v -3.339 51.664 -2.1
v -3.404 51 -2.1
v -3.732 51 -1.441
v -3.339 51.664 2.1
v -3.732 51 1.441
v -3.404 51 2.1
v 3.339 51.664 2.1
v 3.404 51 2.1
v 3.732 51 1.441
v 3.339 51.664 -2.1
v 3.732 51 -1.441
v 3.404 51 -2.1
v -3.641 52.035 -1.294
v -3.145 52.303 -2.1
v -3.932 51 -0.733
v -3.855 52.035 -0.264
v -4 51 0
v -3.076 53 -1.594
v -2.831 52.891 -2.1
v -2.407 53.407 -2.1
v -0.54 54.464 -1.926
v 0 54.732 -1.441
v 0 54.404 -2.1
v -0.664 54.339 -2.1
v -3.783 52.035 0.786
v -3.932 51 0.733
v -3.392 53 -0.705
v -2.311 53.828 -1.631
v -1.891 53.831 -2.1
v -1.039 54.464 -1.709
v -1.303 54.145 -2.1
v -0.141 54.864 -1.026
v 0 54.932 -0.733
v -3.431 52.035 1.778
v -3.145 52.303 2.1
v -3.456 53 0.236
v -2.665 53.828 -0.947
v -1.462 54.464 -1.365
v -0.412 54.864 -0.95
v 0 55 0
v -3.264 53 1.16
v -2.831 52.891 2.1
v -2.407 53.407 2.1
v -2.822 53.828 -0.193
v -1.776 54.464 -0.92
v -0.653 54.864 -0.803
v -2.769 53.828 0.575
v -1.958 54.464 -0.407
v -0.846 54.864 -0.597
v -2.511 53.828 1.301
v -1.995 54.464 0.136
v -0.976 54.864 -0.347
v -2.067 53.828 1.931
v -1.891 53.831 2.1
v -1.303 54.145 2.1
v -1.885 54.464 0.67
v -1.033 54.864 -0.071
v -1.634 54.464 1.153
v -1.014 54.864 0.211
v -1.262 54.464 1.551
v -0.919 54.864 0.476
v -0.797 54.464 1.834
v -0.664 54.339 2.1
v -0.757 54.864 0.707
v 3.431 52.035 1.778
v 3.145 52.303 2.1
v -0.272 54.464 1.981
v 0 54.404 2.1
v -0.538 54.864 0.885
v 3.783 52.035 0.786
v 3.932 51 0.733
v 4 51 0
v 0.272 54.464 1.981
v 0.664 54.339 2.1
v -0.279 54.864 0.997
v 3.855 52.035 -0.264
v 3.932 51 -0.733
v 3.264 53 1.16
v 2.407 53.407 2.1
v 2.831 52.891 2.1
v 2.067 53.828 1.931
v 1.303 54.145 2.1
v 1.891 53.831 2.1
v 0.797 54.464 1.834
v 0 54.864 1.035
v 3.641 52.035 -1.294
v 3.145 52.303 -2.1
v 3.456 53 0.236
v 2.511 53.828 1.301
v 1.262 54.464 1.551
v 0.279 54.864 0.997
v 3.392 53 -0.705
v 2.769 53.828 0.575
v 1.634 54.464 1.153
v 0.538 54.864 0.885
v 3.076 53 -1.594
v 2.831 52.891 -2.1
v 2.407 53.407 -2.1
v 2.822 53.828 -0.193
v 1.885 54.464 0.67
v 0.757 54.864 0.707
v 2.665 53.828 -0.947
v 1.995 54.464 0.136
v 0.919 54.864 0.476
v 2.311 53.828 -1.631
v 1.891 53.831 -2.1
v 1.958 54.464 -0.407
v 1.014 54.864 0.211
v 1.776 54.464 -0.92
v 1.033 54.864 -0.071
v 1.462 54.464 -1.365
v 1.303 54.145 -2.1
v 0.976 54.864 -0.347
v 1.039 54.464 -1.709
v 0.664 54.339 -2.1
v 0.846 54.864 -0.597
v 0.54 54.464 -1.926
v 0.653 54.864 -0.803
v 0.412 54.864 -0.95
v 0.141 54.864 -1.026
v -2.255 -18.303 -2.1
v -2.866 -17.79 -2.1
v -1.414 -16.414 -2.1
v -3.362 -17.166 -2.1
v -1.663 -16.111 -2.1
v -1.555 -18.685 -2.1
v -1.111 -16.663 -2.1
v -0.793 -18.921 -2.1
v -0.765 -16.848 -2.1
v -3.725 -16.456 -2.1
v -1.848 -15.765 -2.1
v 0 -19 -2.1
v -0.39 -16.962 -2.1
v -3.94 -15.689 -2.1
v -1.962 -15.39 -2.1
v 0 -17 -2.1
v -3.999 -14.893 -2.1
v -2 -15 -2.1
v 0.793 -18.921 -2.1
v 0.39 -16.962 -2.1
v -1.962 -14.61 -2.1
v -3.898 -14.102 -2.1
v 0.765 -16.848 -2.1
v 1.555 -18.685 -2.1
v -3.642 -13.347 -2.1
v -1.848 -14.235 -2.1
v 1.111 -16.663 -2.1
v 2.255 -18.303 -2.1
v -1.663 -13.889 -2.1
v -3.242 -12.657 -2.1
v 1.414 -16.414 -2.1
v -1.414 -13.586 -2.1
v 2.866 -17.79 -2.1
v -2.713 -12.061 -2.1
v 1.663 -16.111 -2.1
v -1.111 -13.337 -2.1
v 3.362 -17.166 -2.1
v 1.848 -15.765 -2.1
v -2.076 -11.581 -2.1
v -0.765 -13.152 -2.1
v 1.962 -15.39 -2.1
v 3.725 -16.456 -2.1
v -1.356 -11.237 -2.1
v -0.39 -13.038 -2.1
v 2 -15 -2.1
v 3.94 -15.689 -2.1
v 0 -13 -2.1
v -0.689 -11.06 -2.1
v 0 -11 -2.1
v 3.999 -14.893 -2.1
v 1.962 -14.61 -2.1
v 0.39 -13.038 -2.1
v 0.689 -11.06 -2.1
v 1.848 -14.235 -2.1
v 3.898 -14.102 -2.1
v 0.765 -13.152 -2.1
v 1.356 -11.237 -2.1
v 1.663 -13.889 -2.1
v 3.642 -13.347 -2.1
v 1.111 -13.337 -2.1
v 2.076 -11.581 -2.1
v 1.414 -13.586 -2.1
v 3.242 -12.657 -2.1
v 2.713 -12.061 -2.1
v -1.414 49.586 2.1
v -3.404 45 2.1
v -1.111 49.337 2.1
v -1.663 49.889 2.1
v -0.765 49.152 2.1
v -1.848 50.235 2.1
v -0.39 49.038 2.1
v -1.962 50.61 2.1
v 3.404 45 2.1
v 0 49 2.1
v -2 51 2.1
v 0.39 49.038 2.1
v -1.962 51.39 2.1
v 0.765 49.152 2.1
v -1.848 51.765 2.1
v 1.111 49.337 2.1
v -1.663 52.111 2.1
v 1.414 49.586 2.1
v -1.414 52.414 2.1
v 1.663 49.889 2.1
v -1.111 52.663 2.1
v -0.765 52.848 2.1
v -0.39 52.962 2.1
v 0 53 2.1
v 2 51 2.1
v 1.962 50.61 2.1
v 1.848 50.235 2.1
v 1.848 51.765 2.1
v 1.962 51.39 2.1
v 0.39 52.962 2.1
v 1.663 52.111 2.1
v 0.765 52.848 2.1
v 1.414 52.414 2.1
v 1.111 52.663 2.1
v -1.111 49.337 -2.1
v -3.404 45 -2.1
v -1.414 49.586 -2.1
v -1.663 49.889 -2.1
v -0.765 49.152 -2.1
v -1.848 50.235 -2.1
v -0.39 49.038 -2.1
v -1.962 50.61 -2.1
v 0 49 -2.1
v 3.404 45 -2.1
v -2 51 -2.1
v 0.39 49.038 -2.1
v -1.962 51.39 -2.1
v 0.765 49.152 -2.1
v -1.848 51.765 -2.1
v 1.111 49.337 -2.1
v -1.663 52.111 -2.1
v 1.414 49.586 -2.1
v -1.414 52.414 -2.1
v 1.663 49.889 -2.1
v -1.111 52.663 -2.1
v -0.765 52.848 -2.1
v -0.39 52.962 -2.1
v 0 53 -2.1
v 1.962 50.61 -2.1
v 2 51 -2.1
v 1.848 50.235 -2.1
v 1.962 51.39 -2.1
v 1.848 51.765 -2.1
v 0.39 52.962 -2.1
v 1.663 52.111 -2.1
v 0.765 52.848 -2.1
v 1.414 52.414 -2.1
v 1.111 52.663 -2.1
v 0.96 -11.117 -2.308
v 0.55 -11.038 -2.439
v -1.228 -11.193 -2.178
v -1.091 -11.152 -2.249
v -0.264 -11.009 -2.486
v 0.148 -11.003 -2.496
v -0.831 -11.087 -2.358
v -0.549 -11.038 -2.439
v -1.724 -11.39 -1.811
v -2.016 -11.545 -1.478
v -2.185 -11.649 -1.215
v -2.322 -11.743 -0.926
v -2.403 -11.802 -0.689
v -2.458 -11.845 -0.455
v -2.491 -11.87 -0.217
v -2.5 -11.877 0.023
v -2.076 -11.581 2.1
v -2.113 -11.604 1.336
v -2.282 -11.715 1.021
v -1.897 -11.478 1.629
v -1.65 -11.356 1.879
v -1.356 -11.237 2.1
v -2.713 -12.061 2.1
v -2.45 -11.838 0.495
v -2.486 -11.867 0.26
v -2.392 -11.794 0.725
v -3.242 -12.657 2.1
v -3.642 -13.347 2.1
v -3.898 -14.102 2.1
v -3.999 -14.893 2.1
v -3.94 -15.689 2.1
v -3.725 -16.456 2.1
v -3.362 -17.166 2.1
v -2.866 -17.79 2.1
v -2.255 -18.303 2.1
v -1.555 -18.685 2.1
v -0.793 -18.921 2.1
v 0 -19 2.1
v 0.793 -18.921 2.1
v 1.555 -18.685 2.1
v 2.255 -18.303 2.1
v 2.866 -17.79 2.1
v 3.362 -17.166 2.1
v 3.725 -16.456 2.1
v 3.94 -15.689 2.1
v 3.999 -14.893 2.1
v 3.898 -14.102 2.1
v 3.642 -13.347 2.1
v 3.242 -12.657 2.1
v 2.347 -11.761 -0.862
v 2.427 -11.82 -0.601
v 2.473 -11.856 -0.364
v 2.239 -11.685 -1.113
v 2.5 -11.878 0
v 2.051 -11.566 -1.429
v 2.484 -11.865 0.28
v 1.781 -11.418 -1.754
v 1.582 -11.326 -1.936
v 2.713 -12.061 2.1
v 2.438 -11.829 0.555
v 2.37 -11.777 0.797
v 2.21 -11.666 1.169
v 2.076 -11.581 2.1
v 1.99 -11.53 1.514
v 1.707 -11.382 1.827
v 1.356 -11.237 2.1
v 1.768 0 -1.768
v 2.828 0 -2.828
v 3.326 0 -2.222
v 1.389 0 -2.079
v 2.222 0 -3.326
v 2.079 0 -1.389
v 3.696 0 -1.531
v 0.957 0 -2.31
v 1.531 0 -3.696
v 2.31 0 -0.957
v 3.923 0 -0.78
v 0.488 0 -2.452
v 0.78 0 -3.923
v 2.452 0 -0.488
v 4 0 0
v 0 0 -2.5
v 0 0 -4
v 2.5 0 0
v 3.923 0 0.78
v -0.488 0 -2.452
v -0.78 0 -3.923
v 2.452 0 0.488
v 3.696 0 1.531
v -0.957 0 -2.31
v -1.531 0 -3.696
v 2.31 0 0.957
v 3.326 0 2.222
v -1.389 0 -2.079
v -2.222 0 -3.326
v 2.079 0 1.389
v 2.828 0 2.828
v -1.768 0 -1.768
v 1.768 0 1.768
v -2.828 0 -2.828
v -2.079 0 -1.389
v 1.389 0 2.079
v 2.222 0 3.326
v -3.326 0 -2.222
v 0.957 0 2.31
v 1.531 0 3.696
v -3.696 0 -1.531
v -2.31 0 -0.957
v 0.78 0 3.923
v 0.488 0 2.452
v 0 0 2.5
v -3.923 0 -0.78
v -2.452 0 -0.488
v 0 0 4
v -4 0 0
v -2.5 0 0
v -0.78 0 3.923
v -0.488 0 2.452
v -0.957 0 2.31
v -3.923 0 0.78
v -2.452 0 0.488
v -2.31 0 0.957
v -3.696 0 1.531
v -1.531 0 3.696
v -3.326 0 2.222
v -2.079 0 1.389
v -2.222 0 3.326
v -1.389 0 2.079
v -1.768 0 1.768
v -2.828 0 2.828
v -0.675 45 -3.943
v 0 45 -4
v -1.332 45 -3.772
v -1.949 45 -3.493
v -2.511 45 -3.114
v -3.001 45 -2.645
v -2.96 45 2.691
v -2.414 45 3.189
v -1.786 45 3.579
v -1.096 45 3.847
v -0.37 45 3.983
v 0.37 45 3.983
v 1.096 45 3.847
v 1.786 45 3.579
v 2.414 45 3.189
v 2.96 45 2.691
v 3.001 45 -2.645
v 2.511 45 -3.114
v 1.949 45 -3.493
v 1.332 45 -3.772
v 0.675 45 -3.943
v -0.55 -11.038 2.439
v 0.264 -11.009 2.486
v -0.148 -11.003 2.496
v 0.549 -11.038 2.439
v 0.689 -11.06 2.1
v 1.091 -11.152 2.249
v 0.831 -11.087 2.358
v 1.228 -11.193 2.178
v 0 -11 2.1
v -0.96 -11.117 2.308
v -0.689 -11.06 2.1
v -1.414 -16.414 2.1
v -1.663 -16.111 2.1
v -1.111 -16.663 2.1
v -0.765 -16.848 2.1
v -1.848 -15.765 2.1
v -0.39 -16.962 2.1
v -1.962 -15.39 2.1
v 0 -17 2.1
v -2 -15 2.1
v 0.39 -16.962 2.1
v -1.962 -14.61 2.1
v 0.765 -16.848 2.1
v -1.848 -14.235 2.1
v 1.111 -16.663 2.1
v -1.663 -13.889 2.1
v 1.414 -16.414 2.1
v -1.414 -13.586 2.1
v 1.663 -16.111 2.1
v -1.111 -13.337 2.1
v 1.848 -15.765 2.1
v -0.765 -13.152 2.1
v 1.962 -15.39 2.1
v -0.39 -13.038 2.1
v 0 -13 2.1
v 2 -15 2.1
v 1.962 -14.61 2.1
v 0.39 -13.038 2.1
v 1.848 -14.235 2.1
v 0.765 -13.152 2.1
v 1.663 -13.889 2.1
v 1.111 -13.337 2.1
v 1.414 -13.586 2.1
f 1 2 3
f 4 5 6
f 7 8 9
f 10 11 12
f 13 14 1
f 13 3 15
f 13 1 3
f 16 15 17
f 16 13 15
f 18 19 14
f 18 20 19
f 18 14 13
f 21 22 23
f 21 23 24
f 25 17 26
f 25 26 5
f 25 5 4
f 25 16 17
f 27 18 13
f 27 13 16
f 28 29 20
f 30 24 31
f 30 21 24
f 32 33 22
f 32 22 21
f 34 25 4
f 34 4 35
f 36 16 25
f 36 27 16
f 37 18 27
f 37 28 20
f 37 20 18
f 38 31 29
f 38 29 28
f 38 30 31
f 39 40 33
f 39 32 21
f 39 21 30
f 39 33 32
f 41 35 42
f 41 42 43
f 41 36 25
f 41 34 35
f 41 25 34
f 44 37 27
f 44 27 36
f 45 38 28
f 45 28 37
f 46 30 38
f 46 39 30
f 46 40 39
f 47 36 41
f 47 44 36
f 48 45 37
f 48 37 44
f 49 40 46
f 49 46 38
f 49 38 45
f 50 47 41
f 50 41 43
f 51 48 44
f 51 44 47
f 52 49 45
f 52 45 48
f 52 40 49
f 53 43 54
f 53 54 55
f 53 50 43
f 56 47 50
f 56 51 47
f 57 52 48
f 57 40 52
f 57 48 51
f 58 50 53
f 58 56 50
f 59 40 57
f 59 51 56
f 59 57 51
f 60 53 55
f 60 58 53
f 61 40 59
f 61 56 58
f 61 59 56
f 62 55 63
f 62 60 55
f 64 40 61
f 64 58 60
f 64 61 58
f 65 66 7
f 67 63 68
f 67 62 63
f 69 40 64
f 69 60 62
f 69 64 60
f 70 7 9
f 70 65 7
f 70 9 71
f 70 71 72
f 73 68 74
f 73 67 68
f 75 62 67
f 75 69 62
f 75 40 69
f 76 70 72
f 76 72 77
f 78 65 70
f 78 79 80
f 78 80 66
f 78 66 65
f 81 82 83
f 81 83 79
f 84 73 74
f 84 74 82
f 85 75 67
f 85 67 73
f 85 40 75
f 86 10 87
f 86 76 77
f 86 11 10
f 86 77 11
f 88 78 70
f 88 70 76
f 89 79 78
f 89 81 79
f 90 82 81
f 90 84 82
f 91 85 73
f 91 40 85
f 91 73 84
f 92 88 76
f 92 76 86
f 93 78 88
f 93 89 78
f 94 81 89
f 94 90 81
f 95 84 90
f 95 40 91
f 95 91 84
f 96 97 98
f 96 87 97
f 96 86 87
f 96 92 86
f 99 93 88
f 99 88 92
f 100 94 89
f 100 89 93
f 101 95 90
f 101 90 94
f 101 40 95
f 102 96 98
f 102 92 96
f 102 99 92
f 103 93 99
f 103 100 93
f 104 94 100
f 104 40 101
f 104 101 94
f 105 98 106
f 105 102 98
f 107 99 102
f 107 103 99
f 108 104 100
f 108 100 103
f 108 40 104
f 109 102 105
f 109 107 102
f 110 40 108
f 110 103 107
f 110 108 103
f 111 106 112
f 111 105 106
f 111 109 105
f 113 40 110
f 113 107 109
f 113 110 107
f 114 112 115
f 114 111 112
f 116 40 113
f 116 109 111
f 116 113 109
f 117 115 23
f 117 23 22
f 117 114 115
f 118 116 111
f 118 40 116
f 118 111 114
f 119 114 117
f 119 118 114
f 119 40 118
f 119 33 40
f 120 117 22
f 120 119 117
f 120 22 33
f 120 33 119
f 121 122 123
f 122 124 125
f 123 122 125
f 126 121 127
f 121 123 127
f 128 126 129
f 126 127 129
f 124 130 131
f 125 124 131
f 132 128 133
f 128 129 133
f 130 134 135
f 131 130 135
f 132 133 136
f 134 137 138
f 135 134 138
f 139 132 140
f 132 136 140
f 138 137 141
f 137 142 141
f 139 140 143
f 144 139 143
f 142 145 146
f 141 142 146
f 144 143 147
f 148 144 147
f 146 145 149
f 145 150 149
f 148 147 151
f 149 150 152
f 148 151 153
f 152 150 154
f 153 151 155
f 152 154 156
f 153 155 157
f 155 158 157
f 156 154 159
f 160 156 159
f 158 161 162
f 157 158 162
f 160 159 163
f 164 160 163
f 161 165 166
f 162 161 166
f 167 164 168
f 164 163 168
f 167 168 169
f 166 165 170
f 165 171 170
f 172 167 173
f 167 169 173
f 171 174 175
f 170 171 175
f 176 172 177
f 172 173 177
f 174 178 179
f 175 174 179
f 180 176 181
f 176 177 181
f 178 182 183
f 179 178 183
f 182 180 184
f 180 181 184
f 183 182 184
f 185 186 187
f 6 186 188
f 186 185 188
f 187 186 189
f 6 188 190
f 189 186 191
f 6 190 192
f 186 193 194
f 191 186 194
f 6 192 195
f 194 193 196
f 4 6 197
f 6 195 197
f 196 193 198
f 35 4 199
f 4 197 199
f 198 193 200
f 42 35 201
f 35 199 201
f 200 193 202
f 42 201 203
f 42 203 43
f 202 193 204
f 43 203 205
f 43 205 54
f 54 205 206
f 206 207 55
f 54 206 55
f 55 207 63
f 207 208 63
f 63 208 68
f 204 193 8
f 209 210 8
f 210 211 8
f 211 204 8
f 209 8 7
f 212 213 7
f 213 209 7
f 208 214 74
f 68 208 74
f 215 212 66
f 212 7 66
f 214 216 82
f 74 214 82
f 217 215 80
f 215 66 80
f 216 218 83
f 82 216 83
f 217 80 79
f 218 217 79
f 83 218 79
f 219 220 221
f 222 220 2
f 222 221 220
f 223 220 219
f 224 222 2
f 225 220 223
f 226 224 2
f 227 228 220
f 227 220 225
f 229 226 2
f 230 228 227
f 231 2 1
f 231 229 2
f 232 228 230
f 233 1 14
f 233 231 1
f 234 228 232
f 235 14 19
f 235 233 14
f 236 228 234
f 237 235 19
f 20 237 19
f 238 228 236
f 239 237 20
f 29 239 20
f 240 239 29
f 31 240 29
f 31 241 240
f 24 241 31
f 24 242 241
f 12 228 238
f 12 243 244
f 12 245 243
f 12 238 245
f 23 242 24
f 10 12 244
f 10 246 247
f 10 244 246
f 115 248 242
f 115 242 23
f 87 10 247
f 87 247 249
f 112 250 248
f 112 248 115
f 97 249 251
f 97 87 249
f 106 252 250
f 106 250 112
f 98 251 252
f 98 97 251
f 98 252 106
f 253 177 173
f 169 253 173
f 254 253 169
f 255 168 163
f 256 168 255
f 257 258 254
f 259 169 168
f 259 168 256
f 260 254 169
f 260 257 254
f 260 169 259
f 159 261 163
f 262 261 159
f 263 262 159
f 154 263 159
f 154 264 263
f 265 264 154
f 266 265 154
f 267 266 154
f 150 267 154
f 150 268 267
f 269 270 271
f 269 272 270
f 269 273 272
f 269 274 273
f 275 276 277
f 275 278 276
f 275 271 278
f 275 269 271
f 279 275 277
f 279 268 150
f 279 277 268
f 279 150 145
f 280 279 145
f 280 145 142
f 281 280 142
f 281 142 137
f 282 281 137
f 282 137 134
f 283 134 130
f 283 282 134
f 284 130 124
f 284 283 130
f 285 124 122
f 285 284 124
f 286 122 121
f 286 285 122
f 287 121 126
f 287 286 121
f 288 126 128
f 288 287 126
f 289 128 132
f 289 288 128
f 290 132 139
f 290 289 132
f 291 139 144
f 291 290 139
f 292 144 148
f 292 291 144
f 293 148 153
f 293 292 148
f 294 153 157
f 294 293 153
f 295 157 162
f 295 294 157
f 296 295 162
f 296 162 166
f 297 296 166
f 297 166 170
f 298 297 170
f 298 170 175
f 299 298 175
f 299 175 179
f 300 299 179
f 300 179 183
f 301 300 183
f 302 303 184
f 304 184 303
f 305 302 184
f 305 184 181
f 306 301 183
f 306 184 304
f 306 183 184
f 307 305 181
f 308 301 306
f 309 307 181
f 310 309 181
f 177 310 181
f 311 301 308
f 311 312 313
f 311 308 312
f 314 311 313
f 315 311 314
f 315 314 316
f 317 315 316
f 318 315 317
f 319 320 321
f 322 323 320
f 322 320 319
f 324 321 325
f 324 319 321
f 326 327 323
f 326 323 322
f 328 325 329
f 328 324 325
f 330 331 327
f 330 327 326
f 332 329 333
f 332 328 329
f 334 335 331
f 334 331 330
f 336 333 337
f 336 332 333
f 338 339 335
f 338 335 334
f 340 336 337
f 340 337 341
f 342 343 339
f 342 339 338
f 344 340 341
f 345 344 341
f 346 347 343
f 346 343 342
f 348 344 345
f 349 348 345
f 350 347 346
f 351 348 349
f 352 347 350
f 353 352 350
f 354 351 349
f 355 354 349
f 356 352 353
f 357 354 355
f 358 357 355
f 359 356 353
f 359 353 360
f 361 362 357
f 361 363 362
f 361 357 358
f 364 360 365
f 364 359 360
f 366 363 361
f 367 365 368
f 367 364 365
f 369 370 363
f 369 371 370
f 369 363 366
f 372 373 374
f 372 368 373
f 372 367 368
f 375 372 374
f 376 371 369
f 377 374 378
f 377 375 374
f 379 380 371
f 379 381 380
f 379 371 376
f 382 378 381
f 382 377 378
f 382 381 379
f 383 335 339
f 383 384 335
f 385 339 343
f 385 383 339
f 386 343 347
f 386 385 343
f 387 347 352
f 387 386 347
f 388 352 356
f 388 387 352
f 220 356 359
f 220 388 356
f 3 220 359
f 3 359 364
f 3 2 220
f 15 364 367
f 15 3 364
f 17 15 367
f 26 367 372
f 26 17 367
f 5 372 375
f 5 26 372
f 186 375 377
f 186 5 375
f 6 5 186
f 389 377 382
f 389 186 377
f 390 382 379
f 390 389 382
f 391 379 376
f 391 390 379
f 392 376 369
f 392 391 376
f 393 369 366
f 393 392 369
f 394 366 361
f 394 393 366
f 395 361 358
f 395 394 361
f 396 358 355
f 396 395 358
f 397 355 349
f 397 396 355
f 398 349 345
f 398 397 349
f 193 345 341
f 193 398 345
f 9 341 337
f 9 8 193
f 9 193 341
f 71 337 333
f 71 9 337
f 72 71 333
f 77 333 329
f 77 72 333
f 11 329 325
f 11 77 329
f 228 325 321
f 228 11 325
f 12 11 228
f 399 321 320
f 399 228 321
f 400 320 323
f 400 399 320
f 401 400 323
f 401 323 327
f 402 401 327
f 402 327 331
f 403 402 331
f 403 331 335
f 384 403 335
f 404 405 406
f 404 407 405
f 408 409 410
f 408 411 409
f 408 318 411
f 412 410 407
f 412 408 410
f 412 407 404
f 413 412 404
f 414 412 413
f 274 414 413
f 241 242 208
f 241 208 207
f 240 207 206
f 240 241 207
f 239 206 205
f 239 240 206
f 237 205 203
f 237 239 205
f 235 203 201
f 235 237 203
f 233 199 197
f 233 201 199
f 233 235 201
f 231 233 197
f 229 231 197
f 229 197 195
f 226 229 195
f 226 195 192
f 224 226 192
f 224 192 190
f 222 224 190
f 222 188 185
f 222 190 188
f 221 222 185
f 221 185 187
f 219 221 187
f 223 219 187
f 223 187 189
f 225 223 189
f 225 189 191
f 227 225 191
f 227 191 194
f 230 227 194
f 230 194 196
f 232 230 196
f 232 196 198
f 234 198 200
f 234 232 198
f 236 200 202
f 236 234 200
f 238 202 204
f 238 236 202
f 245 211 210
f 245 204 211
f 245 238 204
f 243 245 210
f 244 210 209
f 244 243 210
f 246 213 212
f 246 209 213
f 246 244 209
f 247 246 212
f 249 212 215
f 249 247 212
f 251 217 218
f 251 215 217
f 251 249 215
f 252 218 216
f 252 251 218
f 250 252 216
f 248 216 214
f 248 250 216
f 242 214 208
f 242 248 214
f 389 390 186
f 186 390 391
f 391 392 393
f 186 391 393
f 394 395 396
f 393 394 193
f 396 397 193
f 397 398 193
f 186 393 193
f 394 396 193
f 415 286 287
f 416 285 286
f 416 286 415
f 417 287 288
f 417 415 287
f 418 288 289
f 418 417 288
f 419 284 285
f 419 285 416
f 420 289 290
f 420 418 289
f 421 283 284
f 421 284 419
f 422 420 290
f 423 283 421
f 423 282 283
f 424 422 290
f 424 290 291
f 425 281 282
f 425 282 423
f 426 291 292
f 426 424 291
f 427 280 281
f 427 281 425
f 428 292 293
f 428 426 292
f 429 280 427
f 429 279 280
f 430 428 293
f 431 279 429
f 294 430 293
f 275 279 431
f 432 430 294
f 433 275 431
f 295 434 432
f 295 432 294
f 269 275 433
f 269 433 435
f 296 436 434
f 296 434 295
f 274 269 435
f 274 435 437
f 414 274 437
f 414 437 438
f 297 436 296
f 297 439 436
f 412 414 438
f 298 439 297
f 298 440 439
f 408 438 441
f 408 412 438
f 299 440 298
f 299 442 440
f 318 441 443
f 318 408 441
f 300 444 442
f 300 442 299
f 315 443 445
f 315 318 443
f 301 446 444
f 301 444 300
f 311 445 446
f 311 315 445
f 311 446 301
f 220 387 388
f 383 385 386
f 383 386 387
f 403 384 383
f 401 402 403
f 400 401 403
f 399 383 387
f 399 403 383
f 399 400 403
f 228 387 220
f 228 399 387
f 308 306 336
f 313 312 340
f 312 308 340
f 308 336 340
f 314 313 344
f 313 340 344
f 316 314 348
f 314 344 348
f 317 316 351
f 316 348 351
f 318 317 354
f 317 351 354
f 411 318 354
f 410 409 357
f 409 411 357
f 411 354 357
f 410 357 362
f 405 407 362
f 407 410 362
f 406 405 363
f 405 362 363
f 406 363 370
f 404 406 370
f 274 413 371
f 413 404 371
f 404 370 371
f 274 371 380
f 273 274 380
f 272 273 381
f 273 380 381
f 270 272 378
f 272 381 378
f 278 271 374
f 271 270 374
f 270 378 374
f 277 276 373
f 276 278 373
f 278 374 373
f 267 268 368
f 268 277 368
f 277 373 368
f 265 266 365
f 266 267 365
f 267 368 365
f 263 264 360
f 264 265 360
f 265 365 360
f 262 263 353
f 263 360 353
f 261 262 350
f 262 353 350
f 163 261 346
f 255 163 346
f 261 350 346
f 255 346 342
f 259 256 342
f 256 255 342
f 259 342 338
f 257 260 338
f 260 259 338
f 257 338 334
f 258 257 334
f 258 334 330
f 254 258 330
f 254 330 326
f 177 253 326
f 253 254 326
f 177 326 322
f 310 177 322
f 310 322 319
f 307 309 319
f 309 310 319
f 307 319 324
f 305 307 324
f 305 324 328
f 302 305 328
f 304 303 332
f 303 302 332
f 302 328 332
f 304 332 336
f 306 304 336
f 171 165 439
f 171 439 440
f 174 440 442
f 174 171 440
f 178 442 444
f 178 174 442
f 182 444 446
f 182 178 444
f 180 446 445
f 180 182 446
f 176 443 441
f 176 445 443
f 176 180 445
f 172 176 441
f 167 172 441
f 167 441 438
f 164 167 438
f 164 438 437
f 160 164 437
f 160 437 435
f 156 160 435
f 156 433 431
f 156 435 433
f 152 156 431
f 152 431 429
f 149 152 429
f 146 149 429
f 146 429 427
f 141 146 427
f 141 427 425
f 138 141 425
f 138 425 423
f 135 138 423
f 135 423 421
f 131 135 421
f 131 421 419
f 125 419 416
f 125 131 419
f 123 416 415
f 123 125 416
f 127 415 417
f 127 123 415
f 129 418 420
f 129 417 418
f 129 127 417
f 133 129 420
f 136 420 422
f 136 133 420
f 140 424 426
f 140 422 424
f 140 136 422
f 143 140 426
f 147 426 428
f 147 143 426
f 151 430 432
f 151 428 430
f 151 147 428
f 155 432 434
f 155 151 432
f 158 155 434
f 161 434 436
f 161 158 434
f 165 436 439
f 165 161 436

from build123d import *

# Parameters (mm, degrees)
CUT_EXTRUDE1_DEPTH      = 56.290143787
CUT_EXTRUDE1_DEPTH_BACK = 56.290143787
SKETCH4_3_R             = 4
SKETCH4_4_R             = 4
BOSS_EXTRUDE1_DEPTH     = 2.1
CUT_EXTRUDE2_DEPTH      = 56.290143794
CUT_EXTRUDE3_DEPTH      = 56.290143794
CUT_EXTRUDE3_DEPTH_BACK = 56.290143794
SKETCH1_R               = 2


with BuildPart() as part:
    # Sketch3 → Revolve2 (revolve)
    with BuildSketch(Plane.XY):
        with BuildLine():
            Line((0, 0), (4, 0))
            Line((4, 0), (4, 51))
            ThreePointArc((4, 51), (2.828427125, 53.828427125), (0, 55))
            Line((0, 55), (0, 0))
        make_face()
    revolve(axis=Axis((0, 0, 0), (0, 1, 0)))

    # Sketch4 → Revolve3 (revolve)
    with BuildSketch(Plane.XY):
        with BuildLine():
            Line((2.5, -11.877501001), (2.5, 0))
            Line((2.5, 0), (0, 0))
            Line((0, 0), (0, -11))
            ThreePointArc((0, -11), (1.324764885, -11.225745372), (2.5, -11.877501001))
        make_face()
    revolve(axis=Axis((0, 0, 0), (0, -1, 0)))

    # Sketch4<3> → Cut-Extrude1 (cut, two sides: drawn at the far end of the back side and taken through both)
    with BuildSketch(Plane.XY.offset(-CUT_EXTRUDE1_DEPTH_BACK)):
        with Locations((0, -15)):
            Circle(SKETCH4_3_R)
    extrude(amount=CUT_EXTRUDE1_DEPTH + CUT_EXTRUDE1_DEPTH_BACK, mode=Mode.SUBTRACT)

    # Sketch4<4> → Boss-Extrude1 (add, symmetric)
    with BuildSketch(Plane.XY):
        with Locations((0, -15)):
            Circle(SKETCH4_4_R)
    extrude(amount=BOSS_EXTRUDE1_DEPTH, both=True)

    # Sketch5 → Cut-Extrude2 (cut, symmetric)
    with BuildSketch(Plane(origin=(0, 0, 0), x_dir=(0, 0, -1), z_dir=(1, 0, 0))):
        Polygon((-2.1, 211.719272535), (-2.1, 54.404408906), (-2.1, 45), (-4, 45), (-161.314863629, 45), (-388.853749338, 262.296849414), (-229.638885709, 429.016121949), align=None)
    cut_extrude2 = extrude(amount=CUT_EXTRUDE2_DEPTH, both=True, mode=Mode.SUBTRACT)

    # Mirror1: Cut-Extrude2 across plane
    add(cut_extrude2.mirror(Plane.XY), mode=Mode.SUBTRACT)

    # Sketch1 → Cut-Extrude3 (cut, two sides: drawn at the far end of the back side and taken through both)
    with BuildSketch(Plane.XY.offset(-CUT_EXTRUDE3_DEPTH_BACK)):
        with Locations((0, 51)):
            Circle(SKETCH1_R)
        with Locations((0, -15)):
            Circle(SKETCH1_R)
    extrude(amount=CUT_EXTRUDE3_DEPTH + CUT_EXTRUDE3_DEPTH_BACK, mode=Mode.SUBTRACT)


solid = part.part
